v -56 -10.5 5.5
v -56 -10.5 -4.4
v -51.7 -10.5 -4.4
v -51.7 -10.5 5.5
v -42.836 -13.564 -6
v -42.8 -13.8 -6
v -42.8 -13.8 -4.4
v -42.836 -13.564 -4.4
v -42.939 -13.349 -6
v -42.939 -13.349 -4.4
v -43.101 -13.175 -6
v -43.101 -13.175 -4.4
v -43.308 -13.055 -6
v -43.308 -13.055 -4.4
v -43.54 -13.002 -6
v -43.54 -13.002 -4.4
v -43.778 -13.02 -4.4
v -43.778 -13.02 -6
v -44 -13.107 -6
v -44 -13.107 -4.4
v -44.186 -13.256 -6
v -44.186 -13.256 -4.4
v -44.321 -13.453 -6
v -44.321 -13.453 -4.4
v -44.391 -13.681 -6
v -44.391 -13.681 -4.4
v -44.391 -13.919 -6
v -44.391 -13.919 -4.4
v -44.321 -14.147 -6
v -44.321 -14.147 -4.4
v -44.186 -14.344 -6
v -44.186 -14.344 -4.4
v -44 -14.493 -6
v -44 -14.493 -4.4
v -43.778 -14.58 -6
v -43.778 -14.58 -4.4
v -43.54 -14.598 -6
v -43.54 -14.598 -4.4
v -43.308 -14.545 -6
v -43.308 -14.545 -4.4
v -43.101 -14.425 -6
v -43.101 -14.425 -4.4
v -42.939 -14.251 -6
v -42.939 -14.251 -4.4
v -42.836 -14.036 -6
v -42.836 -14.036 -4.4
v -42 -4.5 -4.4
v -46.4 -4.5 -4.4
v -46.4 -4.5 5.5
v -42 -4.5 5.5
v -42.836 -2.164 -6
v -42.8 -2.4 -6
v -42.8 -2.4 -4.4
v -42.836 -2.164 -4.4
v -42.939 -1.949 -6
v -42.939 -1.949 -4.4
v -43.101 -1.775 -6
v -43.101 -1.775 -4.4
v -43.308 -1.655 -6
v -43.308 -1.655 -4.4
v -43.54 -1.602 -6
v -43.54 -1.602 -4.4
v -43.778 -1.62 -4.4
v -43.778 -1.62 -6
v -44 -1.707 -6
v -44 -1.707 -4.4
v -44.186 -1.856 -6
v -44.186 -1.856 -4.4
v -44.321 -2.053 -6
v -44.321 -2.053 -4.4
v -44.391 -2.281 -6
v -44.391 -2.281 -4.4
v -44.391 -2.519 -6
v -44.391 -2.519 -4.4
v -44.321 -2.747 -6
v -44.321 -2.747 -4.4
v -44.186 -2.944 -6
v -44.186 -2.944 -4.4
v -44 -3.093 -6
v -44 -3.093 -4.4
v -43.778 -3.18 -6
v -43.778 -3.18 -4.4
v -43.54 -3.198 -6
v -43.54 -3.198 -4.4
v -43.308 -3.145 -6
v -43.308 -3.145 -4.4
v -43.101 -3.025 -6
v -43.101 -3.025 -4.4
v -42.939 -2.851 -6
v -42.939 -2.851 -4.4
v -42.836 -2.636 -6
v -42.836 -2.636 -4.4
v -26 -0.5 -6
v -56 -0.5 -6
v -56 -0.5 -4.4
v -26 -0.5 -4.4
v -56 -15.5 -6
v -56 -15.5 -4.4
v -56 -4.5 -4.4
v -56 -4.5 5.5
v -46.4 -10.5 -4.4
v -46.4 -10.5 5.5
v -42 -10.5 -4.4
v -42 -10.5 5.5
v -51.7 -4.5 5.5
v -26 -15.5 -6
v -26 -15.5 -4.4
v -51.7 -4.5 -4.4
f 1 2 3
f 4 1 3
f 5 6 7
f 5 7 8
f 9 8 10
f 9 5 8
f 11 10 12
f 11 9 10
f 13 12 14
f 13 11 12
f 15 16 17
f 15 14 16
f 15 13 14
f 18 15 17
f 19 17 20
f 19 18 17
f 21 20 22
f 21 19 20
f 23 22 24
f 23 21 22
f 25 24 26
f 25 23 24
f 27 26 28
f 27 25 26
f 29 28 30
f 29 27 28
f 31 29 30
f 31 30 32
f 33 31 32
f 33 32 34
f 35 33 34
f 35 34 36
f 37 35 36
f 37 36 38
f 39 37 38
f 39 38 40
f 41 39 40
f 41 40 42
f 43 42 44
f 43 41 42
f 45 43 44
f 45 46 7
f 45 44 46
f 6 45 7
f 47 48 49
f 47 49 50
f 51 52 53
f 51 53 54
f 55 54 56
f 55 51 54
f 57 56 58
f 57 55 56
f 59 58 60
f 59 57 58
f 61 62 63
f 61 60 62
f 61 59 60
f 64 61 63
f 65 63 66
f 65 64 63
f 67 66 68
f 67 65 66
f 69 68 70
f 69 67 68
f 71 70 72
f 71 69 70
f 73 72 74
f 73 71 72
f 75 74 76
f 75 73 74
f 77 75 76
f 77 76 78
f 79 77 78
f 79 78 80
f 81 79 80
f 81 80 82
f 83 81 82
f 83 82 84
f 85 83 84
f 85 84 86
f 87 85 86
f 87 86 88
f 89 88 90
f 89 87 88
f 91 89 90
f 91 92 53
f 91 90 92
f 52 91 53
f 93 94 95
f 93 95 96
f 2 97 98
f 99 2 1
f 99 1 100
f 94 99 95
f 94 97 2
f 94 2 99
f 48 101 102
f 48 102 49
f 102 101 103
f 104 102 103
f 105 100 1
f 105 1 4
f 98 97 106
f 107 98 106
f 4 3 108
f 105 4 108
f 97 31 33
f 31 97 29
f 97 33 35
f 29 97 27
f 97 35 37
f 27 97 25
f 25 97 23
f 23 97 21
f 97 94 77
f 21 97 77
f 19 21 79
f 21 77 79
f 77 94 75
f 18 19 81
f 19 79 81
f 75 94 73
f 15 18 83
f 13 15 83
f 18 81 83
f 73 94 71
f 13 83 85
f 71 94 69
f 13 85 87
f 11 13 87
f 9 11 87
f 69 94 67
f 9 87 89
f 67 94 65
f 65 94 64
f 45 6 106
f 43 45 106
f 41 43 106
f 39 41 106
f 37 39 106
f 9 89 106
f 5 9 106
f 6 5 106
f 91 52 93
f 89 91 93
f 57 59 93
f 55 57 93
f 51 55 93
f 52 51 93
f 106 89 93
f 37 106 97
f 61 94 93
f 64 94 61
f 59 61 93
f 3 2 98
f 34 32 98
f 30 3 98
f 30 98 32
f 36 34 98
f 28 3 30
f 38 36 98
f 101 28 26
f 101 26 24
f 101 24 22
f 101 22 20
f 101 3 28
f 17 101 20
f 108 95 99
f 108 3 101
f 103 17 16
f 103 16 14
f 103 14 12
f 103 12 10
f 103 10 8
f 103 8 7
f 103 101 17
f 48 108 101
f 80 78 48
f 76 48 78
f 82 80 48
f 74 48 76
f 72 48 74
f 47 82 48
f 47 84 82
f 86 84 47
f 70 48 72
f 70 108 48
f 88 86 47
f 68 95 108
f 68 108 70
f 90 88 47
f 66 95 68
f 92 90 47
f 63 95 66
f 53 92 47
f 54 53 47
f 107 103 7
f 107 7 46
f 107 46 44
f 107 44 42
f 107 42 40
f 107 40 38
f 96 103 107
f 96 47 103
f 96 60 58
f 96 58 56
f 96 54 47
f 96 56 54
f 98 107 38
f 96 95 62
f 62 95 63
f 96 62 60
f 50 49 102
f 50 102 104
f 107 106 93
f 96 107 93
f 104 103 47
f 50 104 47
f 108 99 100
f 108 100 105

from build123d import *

# Parameters (mm, degrees)
CYLINDER078_R     = 0.8
CYLINDER078_DEPTH = 14.5
CYLINDER077_R     = 0.8
CYLINDER077_DEPTH = 14.5
BOX042_W          = 5.3
BOX042_H          = 8
BOX042_DEPTH      = 10
BOX041_W          = 14
BOX041_H          = 6
BOX041_DEPTH      = 10
BOX040_W          = 30
BOX040_H          = 15
BOX040_DEPTH      = 1.6


with BuildPart() as cylinder130:
    # Cylinder078 → Cylinder078 (new body)
    with BuildSketch(Plane(origin=(-43.6, -13.8, -9), x_dir=(1, 0, 0), z_dir=(0, 0, 1))):
        Circle(CYLINDER078_R)
    extrude(amount=CYLINDER078_DEPTH)


with BuildPart() as fusion109:
    # Cylinder077 → Cylinder077 (new body)
    with BuildSketch(Plane(origin=(-43.6, -2.4, -9), x_dir=(1, 0, 0), z_dir=(0, 0, 1))):
        Circle(CYLINDER077_R)
    extrude(amount=CYLINDER077_DEPTH)

    # Fusion109: union Cylinder130
    add(cylinder130.part)


with BuildPart() as cube040:
    # Box042 → Box042 (new body)
    with BuildSketch(Plane(origin=(-51.7, -11.5, -4.5), x_dir=(1, 0, 0), z_dir=(0, 0, 1))):
        with Locations((2.65, 4)):
            Rectangle(BOX042_W, BOX042_H)
    extrude(amount=BOX042_DEPTH)


with BuildPart() as cut045025:
    # Box041 → Box041 (new body)
    with BuildSketch(Plane(origin=(-56, -10.5, -4.5), x_dir=(1, 0, 0), z_dir=(0, 0, 1))):
        with Locations((7, 3)):
            Rectangle(BOX041_W, BOX041_H)
    extrude(amount=BOX041_DEPTH)

    # Cut045025: cut Cube040
    add(cube040.part, mode=Mode.SUBTRACT)


with BuildPart() as spoke_sensor_pcb001:
    # Box040 → Box040 (new body)
    with BuildSketch(Plane(origin=(-56, -15.5, -6), x_dir=(1, 0, 0), z_dir=(0, 0, 1))):
        with Locations((15, 7.5)):
            Rectangle(BOX040_W, BOX040_H)
    extrude(amount=BOX040_DEPTH)

    # Fusion108: union Cut045025
    add(cut045025.part)

    # Cut045026: cut Fusion109
    add(fusion109.part, mode=Mode.SUBTRACT)


solid = spoke_sensor_pcb001.part
